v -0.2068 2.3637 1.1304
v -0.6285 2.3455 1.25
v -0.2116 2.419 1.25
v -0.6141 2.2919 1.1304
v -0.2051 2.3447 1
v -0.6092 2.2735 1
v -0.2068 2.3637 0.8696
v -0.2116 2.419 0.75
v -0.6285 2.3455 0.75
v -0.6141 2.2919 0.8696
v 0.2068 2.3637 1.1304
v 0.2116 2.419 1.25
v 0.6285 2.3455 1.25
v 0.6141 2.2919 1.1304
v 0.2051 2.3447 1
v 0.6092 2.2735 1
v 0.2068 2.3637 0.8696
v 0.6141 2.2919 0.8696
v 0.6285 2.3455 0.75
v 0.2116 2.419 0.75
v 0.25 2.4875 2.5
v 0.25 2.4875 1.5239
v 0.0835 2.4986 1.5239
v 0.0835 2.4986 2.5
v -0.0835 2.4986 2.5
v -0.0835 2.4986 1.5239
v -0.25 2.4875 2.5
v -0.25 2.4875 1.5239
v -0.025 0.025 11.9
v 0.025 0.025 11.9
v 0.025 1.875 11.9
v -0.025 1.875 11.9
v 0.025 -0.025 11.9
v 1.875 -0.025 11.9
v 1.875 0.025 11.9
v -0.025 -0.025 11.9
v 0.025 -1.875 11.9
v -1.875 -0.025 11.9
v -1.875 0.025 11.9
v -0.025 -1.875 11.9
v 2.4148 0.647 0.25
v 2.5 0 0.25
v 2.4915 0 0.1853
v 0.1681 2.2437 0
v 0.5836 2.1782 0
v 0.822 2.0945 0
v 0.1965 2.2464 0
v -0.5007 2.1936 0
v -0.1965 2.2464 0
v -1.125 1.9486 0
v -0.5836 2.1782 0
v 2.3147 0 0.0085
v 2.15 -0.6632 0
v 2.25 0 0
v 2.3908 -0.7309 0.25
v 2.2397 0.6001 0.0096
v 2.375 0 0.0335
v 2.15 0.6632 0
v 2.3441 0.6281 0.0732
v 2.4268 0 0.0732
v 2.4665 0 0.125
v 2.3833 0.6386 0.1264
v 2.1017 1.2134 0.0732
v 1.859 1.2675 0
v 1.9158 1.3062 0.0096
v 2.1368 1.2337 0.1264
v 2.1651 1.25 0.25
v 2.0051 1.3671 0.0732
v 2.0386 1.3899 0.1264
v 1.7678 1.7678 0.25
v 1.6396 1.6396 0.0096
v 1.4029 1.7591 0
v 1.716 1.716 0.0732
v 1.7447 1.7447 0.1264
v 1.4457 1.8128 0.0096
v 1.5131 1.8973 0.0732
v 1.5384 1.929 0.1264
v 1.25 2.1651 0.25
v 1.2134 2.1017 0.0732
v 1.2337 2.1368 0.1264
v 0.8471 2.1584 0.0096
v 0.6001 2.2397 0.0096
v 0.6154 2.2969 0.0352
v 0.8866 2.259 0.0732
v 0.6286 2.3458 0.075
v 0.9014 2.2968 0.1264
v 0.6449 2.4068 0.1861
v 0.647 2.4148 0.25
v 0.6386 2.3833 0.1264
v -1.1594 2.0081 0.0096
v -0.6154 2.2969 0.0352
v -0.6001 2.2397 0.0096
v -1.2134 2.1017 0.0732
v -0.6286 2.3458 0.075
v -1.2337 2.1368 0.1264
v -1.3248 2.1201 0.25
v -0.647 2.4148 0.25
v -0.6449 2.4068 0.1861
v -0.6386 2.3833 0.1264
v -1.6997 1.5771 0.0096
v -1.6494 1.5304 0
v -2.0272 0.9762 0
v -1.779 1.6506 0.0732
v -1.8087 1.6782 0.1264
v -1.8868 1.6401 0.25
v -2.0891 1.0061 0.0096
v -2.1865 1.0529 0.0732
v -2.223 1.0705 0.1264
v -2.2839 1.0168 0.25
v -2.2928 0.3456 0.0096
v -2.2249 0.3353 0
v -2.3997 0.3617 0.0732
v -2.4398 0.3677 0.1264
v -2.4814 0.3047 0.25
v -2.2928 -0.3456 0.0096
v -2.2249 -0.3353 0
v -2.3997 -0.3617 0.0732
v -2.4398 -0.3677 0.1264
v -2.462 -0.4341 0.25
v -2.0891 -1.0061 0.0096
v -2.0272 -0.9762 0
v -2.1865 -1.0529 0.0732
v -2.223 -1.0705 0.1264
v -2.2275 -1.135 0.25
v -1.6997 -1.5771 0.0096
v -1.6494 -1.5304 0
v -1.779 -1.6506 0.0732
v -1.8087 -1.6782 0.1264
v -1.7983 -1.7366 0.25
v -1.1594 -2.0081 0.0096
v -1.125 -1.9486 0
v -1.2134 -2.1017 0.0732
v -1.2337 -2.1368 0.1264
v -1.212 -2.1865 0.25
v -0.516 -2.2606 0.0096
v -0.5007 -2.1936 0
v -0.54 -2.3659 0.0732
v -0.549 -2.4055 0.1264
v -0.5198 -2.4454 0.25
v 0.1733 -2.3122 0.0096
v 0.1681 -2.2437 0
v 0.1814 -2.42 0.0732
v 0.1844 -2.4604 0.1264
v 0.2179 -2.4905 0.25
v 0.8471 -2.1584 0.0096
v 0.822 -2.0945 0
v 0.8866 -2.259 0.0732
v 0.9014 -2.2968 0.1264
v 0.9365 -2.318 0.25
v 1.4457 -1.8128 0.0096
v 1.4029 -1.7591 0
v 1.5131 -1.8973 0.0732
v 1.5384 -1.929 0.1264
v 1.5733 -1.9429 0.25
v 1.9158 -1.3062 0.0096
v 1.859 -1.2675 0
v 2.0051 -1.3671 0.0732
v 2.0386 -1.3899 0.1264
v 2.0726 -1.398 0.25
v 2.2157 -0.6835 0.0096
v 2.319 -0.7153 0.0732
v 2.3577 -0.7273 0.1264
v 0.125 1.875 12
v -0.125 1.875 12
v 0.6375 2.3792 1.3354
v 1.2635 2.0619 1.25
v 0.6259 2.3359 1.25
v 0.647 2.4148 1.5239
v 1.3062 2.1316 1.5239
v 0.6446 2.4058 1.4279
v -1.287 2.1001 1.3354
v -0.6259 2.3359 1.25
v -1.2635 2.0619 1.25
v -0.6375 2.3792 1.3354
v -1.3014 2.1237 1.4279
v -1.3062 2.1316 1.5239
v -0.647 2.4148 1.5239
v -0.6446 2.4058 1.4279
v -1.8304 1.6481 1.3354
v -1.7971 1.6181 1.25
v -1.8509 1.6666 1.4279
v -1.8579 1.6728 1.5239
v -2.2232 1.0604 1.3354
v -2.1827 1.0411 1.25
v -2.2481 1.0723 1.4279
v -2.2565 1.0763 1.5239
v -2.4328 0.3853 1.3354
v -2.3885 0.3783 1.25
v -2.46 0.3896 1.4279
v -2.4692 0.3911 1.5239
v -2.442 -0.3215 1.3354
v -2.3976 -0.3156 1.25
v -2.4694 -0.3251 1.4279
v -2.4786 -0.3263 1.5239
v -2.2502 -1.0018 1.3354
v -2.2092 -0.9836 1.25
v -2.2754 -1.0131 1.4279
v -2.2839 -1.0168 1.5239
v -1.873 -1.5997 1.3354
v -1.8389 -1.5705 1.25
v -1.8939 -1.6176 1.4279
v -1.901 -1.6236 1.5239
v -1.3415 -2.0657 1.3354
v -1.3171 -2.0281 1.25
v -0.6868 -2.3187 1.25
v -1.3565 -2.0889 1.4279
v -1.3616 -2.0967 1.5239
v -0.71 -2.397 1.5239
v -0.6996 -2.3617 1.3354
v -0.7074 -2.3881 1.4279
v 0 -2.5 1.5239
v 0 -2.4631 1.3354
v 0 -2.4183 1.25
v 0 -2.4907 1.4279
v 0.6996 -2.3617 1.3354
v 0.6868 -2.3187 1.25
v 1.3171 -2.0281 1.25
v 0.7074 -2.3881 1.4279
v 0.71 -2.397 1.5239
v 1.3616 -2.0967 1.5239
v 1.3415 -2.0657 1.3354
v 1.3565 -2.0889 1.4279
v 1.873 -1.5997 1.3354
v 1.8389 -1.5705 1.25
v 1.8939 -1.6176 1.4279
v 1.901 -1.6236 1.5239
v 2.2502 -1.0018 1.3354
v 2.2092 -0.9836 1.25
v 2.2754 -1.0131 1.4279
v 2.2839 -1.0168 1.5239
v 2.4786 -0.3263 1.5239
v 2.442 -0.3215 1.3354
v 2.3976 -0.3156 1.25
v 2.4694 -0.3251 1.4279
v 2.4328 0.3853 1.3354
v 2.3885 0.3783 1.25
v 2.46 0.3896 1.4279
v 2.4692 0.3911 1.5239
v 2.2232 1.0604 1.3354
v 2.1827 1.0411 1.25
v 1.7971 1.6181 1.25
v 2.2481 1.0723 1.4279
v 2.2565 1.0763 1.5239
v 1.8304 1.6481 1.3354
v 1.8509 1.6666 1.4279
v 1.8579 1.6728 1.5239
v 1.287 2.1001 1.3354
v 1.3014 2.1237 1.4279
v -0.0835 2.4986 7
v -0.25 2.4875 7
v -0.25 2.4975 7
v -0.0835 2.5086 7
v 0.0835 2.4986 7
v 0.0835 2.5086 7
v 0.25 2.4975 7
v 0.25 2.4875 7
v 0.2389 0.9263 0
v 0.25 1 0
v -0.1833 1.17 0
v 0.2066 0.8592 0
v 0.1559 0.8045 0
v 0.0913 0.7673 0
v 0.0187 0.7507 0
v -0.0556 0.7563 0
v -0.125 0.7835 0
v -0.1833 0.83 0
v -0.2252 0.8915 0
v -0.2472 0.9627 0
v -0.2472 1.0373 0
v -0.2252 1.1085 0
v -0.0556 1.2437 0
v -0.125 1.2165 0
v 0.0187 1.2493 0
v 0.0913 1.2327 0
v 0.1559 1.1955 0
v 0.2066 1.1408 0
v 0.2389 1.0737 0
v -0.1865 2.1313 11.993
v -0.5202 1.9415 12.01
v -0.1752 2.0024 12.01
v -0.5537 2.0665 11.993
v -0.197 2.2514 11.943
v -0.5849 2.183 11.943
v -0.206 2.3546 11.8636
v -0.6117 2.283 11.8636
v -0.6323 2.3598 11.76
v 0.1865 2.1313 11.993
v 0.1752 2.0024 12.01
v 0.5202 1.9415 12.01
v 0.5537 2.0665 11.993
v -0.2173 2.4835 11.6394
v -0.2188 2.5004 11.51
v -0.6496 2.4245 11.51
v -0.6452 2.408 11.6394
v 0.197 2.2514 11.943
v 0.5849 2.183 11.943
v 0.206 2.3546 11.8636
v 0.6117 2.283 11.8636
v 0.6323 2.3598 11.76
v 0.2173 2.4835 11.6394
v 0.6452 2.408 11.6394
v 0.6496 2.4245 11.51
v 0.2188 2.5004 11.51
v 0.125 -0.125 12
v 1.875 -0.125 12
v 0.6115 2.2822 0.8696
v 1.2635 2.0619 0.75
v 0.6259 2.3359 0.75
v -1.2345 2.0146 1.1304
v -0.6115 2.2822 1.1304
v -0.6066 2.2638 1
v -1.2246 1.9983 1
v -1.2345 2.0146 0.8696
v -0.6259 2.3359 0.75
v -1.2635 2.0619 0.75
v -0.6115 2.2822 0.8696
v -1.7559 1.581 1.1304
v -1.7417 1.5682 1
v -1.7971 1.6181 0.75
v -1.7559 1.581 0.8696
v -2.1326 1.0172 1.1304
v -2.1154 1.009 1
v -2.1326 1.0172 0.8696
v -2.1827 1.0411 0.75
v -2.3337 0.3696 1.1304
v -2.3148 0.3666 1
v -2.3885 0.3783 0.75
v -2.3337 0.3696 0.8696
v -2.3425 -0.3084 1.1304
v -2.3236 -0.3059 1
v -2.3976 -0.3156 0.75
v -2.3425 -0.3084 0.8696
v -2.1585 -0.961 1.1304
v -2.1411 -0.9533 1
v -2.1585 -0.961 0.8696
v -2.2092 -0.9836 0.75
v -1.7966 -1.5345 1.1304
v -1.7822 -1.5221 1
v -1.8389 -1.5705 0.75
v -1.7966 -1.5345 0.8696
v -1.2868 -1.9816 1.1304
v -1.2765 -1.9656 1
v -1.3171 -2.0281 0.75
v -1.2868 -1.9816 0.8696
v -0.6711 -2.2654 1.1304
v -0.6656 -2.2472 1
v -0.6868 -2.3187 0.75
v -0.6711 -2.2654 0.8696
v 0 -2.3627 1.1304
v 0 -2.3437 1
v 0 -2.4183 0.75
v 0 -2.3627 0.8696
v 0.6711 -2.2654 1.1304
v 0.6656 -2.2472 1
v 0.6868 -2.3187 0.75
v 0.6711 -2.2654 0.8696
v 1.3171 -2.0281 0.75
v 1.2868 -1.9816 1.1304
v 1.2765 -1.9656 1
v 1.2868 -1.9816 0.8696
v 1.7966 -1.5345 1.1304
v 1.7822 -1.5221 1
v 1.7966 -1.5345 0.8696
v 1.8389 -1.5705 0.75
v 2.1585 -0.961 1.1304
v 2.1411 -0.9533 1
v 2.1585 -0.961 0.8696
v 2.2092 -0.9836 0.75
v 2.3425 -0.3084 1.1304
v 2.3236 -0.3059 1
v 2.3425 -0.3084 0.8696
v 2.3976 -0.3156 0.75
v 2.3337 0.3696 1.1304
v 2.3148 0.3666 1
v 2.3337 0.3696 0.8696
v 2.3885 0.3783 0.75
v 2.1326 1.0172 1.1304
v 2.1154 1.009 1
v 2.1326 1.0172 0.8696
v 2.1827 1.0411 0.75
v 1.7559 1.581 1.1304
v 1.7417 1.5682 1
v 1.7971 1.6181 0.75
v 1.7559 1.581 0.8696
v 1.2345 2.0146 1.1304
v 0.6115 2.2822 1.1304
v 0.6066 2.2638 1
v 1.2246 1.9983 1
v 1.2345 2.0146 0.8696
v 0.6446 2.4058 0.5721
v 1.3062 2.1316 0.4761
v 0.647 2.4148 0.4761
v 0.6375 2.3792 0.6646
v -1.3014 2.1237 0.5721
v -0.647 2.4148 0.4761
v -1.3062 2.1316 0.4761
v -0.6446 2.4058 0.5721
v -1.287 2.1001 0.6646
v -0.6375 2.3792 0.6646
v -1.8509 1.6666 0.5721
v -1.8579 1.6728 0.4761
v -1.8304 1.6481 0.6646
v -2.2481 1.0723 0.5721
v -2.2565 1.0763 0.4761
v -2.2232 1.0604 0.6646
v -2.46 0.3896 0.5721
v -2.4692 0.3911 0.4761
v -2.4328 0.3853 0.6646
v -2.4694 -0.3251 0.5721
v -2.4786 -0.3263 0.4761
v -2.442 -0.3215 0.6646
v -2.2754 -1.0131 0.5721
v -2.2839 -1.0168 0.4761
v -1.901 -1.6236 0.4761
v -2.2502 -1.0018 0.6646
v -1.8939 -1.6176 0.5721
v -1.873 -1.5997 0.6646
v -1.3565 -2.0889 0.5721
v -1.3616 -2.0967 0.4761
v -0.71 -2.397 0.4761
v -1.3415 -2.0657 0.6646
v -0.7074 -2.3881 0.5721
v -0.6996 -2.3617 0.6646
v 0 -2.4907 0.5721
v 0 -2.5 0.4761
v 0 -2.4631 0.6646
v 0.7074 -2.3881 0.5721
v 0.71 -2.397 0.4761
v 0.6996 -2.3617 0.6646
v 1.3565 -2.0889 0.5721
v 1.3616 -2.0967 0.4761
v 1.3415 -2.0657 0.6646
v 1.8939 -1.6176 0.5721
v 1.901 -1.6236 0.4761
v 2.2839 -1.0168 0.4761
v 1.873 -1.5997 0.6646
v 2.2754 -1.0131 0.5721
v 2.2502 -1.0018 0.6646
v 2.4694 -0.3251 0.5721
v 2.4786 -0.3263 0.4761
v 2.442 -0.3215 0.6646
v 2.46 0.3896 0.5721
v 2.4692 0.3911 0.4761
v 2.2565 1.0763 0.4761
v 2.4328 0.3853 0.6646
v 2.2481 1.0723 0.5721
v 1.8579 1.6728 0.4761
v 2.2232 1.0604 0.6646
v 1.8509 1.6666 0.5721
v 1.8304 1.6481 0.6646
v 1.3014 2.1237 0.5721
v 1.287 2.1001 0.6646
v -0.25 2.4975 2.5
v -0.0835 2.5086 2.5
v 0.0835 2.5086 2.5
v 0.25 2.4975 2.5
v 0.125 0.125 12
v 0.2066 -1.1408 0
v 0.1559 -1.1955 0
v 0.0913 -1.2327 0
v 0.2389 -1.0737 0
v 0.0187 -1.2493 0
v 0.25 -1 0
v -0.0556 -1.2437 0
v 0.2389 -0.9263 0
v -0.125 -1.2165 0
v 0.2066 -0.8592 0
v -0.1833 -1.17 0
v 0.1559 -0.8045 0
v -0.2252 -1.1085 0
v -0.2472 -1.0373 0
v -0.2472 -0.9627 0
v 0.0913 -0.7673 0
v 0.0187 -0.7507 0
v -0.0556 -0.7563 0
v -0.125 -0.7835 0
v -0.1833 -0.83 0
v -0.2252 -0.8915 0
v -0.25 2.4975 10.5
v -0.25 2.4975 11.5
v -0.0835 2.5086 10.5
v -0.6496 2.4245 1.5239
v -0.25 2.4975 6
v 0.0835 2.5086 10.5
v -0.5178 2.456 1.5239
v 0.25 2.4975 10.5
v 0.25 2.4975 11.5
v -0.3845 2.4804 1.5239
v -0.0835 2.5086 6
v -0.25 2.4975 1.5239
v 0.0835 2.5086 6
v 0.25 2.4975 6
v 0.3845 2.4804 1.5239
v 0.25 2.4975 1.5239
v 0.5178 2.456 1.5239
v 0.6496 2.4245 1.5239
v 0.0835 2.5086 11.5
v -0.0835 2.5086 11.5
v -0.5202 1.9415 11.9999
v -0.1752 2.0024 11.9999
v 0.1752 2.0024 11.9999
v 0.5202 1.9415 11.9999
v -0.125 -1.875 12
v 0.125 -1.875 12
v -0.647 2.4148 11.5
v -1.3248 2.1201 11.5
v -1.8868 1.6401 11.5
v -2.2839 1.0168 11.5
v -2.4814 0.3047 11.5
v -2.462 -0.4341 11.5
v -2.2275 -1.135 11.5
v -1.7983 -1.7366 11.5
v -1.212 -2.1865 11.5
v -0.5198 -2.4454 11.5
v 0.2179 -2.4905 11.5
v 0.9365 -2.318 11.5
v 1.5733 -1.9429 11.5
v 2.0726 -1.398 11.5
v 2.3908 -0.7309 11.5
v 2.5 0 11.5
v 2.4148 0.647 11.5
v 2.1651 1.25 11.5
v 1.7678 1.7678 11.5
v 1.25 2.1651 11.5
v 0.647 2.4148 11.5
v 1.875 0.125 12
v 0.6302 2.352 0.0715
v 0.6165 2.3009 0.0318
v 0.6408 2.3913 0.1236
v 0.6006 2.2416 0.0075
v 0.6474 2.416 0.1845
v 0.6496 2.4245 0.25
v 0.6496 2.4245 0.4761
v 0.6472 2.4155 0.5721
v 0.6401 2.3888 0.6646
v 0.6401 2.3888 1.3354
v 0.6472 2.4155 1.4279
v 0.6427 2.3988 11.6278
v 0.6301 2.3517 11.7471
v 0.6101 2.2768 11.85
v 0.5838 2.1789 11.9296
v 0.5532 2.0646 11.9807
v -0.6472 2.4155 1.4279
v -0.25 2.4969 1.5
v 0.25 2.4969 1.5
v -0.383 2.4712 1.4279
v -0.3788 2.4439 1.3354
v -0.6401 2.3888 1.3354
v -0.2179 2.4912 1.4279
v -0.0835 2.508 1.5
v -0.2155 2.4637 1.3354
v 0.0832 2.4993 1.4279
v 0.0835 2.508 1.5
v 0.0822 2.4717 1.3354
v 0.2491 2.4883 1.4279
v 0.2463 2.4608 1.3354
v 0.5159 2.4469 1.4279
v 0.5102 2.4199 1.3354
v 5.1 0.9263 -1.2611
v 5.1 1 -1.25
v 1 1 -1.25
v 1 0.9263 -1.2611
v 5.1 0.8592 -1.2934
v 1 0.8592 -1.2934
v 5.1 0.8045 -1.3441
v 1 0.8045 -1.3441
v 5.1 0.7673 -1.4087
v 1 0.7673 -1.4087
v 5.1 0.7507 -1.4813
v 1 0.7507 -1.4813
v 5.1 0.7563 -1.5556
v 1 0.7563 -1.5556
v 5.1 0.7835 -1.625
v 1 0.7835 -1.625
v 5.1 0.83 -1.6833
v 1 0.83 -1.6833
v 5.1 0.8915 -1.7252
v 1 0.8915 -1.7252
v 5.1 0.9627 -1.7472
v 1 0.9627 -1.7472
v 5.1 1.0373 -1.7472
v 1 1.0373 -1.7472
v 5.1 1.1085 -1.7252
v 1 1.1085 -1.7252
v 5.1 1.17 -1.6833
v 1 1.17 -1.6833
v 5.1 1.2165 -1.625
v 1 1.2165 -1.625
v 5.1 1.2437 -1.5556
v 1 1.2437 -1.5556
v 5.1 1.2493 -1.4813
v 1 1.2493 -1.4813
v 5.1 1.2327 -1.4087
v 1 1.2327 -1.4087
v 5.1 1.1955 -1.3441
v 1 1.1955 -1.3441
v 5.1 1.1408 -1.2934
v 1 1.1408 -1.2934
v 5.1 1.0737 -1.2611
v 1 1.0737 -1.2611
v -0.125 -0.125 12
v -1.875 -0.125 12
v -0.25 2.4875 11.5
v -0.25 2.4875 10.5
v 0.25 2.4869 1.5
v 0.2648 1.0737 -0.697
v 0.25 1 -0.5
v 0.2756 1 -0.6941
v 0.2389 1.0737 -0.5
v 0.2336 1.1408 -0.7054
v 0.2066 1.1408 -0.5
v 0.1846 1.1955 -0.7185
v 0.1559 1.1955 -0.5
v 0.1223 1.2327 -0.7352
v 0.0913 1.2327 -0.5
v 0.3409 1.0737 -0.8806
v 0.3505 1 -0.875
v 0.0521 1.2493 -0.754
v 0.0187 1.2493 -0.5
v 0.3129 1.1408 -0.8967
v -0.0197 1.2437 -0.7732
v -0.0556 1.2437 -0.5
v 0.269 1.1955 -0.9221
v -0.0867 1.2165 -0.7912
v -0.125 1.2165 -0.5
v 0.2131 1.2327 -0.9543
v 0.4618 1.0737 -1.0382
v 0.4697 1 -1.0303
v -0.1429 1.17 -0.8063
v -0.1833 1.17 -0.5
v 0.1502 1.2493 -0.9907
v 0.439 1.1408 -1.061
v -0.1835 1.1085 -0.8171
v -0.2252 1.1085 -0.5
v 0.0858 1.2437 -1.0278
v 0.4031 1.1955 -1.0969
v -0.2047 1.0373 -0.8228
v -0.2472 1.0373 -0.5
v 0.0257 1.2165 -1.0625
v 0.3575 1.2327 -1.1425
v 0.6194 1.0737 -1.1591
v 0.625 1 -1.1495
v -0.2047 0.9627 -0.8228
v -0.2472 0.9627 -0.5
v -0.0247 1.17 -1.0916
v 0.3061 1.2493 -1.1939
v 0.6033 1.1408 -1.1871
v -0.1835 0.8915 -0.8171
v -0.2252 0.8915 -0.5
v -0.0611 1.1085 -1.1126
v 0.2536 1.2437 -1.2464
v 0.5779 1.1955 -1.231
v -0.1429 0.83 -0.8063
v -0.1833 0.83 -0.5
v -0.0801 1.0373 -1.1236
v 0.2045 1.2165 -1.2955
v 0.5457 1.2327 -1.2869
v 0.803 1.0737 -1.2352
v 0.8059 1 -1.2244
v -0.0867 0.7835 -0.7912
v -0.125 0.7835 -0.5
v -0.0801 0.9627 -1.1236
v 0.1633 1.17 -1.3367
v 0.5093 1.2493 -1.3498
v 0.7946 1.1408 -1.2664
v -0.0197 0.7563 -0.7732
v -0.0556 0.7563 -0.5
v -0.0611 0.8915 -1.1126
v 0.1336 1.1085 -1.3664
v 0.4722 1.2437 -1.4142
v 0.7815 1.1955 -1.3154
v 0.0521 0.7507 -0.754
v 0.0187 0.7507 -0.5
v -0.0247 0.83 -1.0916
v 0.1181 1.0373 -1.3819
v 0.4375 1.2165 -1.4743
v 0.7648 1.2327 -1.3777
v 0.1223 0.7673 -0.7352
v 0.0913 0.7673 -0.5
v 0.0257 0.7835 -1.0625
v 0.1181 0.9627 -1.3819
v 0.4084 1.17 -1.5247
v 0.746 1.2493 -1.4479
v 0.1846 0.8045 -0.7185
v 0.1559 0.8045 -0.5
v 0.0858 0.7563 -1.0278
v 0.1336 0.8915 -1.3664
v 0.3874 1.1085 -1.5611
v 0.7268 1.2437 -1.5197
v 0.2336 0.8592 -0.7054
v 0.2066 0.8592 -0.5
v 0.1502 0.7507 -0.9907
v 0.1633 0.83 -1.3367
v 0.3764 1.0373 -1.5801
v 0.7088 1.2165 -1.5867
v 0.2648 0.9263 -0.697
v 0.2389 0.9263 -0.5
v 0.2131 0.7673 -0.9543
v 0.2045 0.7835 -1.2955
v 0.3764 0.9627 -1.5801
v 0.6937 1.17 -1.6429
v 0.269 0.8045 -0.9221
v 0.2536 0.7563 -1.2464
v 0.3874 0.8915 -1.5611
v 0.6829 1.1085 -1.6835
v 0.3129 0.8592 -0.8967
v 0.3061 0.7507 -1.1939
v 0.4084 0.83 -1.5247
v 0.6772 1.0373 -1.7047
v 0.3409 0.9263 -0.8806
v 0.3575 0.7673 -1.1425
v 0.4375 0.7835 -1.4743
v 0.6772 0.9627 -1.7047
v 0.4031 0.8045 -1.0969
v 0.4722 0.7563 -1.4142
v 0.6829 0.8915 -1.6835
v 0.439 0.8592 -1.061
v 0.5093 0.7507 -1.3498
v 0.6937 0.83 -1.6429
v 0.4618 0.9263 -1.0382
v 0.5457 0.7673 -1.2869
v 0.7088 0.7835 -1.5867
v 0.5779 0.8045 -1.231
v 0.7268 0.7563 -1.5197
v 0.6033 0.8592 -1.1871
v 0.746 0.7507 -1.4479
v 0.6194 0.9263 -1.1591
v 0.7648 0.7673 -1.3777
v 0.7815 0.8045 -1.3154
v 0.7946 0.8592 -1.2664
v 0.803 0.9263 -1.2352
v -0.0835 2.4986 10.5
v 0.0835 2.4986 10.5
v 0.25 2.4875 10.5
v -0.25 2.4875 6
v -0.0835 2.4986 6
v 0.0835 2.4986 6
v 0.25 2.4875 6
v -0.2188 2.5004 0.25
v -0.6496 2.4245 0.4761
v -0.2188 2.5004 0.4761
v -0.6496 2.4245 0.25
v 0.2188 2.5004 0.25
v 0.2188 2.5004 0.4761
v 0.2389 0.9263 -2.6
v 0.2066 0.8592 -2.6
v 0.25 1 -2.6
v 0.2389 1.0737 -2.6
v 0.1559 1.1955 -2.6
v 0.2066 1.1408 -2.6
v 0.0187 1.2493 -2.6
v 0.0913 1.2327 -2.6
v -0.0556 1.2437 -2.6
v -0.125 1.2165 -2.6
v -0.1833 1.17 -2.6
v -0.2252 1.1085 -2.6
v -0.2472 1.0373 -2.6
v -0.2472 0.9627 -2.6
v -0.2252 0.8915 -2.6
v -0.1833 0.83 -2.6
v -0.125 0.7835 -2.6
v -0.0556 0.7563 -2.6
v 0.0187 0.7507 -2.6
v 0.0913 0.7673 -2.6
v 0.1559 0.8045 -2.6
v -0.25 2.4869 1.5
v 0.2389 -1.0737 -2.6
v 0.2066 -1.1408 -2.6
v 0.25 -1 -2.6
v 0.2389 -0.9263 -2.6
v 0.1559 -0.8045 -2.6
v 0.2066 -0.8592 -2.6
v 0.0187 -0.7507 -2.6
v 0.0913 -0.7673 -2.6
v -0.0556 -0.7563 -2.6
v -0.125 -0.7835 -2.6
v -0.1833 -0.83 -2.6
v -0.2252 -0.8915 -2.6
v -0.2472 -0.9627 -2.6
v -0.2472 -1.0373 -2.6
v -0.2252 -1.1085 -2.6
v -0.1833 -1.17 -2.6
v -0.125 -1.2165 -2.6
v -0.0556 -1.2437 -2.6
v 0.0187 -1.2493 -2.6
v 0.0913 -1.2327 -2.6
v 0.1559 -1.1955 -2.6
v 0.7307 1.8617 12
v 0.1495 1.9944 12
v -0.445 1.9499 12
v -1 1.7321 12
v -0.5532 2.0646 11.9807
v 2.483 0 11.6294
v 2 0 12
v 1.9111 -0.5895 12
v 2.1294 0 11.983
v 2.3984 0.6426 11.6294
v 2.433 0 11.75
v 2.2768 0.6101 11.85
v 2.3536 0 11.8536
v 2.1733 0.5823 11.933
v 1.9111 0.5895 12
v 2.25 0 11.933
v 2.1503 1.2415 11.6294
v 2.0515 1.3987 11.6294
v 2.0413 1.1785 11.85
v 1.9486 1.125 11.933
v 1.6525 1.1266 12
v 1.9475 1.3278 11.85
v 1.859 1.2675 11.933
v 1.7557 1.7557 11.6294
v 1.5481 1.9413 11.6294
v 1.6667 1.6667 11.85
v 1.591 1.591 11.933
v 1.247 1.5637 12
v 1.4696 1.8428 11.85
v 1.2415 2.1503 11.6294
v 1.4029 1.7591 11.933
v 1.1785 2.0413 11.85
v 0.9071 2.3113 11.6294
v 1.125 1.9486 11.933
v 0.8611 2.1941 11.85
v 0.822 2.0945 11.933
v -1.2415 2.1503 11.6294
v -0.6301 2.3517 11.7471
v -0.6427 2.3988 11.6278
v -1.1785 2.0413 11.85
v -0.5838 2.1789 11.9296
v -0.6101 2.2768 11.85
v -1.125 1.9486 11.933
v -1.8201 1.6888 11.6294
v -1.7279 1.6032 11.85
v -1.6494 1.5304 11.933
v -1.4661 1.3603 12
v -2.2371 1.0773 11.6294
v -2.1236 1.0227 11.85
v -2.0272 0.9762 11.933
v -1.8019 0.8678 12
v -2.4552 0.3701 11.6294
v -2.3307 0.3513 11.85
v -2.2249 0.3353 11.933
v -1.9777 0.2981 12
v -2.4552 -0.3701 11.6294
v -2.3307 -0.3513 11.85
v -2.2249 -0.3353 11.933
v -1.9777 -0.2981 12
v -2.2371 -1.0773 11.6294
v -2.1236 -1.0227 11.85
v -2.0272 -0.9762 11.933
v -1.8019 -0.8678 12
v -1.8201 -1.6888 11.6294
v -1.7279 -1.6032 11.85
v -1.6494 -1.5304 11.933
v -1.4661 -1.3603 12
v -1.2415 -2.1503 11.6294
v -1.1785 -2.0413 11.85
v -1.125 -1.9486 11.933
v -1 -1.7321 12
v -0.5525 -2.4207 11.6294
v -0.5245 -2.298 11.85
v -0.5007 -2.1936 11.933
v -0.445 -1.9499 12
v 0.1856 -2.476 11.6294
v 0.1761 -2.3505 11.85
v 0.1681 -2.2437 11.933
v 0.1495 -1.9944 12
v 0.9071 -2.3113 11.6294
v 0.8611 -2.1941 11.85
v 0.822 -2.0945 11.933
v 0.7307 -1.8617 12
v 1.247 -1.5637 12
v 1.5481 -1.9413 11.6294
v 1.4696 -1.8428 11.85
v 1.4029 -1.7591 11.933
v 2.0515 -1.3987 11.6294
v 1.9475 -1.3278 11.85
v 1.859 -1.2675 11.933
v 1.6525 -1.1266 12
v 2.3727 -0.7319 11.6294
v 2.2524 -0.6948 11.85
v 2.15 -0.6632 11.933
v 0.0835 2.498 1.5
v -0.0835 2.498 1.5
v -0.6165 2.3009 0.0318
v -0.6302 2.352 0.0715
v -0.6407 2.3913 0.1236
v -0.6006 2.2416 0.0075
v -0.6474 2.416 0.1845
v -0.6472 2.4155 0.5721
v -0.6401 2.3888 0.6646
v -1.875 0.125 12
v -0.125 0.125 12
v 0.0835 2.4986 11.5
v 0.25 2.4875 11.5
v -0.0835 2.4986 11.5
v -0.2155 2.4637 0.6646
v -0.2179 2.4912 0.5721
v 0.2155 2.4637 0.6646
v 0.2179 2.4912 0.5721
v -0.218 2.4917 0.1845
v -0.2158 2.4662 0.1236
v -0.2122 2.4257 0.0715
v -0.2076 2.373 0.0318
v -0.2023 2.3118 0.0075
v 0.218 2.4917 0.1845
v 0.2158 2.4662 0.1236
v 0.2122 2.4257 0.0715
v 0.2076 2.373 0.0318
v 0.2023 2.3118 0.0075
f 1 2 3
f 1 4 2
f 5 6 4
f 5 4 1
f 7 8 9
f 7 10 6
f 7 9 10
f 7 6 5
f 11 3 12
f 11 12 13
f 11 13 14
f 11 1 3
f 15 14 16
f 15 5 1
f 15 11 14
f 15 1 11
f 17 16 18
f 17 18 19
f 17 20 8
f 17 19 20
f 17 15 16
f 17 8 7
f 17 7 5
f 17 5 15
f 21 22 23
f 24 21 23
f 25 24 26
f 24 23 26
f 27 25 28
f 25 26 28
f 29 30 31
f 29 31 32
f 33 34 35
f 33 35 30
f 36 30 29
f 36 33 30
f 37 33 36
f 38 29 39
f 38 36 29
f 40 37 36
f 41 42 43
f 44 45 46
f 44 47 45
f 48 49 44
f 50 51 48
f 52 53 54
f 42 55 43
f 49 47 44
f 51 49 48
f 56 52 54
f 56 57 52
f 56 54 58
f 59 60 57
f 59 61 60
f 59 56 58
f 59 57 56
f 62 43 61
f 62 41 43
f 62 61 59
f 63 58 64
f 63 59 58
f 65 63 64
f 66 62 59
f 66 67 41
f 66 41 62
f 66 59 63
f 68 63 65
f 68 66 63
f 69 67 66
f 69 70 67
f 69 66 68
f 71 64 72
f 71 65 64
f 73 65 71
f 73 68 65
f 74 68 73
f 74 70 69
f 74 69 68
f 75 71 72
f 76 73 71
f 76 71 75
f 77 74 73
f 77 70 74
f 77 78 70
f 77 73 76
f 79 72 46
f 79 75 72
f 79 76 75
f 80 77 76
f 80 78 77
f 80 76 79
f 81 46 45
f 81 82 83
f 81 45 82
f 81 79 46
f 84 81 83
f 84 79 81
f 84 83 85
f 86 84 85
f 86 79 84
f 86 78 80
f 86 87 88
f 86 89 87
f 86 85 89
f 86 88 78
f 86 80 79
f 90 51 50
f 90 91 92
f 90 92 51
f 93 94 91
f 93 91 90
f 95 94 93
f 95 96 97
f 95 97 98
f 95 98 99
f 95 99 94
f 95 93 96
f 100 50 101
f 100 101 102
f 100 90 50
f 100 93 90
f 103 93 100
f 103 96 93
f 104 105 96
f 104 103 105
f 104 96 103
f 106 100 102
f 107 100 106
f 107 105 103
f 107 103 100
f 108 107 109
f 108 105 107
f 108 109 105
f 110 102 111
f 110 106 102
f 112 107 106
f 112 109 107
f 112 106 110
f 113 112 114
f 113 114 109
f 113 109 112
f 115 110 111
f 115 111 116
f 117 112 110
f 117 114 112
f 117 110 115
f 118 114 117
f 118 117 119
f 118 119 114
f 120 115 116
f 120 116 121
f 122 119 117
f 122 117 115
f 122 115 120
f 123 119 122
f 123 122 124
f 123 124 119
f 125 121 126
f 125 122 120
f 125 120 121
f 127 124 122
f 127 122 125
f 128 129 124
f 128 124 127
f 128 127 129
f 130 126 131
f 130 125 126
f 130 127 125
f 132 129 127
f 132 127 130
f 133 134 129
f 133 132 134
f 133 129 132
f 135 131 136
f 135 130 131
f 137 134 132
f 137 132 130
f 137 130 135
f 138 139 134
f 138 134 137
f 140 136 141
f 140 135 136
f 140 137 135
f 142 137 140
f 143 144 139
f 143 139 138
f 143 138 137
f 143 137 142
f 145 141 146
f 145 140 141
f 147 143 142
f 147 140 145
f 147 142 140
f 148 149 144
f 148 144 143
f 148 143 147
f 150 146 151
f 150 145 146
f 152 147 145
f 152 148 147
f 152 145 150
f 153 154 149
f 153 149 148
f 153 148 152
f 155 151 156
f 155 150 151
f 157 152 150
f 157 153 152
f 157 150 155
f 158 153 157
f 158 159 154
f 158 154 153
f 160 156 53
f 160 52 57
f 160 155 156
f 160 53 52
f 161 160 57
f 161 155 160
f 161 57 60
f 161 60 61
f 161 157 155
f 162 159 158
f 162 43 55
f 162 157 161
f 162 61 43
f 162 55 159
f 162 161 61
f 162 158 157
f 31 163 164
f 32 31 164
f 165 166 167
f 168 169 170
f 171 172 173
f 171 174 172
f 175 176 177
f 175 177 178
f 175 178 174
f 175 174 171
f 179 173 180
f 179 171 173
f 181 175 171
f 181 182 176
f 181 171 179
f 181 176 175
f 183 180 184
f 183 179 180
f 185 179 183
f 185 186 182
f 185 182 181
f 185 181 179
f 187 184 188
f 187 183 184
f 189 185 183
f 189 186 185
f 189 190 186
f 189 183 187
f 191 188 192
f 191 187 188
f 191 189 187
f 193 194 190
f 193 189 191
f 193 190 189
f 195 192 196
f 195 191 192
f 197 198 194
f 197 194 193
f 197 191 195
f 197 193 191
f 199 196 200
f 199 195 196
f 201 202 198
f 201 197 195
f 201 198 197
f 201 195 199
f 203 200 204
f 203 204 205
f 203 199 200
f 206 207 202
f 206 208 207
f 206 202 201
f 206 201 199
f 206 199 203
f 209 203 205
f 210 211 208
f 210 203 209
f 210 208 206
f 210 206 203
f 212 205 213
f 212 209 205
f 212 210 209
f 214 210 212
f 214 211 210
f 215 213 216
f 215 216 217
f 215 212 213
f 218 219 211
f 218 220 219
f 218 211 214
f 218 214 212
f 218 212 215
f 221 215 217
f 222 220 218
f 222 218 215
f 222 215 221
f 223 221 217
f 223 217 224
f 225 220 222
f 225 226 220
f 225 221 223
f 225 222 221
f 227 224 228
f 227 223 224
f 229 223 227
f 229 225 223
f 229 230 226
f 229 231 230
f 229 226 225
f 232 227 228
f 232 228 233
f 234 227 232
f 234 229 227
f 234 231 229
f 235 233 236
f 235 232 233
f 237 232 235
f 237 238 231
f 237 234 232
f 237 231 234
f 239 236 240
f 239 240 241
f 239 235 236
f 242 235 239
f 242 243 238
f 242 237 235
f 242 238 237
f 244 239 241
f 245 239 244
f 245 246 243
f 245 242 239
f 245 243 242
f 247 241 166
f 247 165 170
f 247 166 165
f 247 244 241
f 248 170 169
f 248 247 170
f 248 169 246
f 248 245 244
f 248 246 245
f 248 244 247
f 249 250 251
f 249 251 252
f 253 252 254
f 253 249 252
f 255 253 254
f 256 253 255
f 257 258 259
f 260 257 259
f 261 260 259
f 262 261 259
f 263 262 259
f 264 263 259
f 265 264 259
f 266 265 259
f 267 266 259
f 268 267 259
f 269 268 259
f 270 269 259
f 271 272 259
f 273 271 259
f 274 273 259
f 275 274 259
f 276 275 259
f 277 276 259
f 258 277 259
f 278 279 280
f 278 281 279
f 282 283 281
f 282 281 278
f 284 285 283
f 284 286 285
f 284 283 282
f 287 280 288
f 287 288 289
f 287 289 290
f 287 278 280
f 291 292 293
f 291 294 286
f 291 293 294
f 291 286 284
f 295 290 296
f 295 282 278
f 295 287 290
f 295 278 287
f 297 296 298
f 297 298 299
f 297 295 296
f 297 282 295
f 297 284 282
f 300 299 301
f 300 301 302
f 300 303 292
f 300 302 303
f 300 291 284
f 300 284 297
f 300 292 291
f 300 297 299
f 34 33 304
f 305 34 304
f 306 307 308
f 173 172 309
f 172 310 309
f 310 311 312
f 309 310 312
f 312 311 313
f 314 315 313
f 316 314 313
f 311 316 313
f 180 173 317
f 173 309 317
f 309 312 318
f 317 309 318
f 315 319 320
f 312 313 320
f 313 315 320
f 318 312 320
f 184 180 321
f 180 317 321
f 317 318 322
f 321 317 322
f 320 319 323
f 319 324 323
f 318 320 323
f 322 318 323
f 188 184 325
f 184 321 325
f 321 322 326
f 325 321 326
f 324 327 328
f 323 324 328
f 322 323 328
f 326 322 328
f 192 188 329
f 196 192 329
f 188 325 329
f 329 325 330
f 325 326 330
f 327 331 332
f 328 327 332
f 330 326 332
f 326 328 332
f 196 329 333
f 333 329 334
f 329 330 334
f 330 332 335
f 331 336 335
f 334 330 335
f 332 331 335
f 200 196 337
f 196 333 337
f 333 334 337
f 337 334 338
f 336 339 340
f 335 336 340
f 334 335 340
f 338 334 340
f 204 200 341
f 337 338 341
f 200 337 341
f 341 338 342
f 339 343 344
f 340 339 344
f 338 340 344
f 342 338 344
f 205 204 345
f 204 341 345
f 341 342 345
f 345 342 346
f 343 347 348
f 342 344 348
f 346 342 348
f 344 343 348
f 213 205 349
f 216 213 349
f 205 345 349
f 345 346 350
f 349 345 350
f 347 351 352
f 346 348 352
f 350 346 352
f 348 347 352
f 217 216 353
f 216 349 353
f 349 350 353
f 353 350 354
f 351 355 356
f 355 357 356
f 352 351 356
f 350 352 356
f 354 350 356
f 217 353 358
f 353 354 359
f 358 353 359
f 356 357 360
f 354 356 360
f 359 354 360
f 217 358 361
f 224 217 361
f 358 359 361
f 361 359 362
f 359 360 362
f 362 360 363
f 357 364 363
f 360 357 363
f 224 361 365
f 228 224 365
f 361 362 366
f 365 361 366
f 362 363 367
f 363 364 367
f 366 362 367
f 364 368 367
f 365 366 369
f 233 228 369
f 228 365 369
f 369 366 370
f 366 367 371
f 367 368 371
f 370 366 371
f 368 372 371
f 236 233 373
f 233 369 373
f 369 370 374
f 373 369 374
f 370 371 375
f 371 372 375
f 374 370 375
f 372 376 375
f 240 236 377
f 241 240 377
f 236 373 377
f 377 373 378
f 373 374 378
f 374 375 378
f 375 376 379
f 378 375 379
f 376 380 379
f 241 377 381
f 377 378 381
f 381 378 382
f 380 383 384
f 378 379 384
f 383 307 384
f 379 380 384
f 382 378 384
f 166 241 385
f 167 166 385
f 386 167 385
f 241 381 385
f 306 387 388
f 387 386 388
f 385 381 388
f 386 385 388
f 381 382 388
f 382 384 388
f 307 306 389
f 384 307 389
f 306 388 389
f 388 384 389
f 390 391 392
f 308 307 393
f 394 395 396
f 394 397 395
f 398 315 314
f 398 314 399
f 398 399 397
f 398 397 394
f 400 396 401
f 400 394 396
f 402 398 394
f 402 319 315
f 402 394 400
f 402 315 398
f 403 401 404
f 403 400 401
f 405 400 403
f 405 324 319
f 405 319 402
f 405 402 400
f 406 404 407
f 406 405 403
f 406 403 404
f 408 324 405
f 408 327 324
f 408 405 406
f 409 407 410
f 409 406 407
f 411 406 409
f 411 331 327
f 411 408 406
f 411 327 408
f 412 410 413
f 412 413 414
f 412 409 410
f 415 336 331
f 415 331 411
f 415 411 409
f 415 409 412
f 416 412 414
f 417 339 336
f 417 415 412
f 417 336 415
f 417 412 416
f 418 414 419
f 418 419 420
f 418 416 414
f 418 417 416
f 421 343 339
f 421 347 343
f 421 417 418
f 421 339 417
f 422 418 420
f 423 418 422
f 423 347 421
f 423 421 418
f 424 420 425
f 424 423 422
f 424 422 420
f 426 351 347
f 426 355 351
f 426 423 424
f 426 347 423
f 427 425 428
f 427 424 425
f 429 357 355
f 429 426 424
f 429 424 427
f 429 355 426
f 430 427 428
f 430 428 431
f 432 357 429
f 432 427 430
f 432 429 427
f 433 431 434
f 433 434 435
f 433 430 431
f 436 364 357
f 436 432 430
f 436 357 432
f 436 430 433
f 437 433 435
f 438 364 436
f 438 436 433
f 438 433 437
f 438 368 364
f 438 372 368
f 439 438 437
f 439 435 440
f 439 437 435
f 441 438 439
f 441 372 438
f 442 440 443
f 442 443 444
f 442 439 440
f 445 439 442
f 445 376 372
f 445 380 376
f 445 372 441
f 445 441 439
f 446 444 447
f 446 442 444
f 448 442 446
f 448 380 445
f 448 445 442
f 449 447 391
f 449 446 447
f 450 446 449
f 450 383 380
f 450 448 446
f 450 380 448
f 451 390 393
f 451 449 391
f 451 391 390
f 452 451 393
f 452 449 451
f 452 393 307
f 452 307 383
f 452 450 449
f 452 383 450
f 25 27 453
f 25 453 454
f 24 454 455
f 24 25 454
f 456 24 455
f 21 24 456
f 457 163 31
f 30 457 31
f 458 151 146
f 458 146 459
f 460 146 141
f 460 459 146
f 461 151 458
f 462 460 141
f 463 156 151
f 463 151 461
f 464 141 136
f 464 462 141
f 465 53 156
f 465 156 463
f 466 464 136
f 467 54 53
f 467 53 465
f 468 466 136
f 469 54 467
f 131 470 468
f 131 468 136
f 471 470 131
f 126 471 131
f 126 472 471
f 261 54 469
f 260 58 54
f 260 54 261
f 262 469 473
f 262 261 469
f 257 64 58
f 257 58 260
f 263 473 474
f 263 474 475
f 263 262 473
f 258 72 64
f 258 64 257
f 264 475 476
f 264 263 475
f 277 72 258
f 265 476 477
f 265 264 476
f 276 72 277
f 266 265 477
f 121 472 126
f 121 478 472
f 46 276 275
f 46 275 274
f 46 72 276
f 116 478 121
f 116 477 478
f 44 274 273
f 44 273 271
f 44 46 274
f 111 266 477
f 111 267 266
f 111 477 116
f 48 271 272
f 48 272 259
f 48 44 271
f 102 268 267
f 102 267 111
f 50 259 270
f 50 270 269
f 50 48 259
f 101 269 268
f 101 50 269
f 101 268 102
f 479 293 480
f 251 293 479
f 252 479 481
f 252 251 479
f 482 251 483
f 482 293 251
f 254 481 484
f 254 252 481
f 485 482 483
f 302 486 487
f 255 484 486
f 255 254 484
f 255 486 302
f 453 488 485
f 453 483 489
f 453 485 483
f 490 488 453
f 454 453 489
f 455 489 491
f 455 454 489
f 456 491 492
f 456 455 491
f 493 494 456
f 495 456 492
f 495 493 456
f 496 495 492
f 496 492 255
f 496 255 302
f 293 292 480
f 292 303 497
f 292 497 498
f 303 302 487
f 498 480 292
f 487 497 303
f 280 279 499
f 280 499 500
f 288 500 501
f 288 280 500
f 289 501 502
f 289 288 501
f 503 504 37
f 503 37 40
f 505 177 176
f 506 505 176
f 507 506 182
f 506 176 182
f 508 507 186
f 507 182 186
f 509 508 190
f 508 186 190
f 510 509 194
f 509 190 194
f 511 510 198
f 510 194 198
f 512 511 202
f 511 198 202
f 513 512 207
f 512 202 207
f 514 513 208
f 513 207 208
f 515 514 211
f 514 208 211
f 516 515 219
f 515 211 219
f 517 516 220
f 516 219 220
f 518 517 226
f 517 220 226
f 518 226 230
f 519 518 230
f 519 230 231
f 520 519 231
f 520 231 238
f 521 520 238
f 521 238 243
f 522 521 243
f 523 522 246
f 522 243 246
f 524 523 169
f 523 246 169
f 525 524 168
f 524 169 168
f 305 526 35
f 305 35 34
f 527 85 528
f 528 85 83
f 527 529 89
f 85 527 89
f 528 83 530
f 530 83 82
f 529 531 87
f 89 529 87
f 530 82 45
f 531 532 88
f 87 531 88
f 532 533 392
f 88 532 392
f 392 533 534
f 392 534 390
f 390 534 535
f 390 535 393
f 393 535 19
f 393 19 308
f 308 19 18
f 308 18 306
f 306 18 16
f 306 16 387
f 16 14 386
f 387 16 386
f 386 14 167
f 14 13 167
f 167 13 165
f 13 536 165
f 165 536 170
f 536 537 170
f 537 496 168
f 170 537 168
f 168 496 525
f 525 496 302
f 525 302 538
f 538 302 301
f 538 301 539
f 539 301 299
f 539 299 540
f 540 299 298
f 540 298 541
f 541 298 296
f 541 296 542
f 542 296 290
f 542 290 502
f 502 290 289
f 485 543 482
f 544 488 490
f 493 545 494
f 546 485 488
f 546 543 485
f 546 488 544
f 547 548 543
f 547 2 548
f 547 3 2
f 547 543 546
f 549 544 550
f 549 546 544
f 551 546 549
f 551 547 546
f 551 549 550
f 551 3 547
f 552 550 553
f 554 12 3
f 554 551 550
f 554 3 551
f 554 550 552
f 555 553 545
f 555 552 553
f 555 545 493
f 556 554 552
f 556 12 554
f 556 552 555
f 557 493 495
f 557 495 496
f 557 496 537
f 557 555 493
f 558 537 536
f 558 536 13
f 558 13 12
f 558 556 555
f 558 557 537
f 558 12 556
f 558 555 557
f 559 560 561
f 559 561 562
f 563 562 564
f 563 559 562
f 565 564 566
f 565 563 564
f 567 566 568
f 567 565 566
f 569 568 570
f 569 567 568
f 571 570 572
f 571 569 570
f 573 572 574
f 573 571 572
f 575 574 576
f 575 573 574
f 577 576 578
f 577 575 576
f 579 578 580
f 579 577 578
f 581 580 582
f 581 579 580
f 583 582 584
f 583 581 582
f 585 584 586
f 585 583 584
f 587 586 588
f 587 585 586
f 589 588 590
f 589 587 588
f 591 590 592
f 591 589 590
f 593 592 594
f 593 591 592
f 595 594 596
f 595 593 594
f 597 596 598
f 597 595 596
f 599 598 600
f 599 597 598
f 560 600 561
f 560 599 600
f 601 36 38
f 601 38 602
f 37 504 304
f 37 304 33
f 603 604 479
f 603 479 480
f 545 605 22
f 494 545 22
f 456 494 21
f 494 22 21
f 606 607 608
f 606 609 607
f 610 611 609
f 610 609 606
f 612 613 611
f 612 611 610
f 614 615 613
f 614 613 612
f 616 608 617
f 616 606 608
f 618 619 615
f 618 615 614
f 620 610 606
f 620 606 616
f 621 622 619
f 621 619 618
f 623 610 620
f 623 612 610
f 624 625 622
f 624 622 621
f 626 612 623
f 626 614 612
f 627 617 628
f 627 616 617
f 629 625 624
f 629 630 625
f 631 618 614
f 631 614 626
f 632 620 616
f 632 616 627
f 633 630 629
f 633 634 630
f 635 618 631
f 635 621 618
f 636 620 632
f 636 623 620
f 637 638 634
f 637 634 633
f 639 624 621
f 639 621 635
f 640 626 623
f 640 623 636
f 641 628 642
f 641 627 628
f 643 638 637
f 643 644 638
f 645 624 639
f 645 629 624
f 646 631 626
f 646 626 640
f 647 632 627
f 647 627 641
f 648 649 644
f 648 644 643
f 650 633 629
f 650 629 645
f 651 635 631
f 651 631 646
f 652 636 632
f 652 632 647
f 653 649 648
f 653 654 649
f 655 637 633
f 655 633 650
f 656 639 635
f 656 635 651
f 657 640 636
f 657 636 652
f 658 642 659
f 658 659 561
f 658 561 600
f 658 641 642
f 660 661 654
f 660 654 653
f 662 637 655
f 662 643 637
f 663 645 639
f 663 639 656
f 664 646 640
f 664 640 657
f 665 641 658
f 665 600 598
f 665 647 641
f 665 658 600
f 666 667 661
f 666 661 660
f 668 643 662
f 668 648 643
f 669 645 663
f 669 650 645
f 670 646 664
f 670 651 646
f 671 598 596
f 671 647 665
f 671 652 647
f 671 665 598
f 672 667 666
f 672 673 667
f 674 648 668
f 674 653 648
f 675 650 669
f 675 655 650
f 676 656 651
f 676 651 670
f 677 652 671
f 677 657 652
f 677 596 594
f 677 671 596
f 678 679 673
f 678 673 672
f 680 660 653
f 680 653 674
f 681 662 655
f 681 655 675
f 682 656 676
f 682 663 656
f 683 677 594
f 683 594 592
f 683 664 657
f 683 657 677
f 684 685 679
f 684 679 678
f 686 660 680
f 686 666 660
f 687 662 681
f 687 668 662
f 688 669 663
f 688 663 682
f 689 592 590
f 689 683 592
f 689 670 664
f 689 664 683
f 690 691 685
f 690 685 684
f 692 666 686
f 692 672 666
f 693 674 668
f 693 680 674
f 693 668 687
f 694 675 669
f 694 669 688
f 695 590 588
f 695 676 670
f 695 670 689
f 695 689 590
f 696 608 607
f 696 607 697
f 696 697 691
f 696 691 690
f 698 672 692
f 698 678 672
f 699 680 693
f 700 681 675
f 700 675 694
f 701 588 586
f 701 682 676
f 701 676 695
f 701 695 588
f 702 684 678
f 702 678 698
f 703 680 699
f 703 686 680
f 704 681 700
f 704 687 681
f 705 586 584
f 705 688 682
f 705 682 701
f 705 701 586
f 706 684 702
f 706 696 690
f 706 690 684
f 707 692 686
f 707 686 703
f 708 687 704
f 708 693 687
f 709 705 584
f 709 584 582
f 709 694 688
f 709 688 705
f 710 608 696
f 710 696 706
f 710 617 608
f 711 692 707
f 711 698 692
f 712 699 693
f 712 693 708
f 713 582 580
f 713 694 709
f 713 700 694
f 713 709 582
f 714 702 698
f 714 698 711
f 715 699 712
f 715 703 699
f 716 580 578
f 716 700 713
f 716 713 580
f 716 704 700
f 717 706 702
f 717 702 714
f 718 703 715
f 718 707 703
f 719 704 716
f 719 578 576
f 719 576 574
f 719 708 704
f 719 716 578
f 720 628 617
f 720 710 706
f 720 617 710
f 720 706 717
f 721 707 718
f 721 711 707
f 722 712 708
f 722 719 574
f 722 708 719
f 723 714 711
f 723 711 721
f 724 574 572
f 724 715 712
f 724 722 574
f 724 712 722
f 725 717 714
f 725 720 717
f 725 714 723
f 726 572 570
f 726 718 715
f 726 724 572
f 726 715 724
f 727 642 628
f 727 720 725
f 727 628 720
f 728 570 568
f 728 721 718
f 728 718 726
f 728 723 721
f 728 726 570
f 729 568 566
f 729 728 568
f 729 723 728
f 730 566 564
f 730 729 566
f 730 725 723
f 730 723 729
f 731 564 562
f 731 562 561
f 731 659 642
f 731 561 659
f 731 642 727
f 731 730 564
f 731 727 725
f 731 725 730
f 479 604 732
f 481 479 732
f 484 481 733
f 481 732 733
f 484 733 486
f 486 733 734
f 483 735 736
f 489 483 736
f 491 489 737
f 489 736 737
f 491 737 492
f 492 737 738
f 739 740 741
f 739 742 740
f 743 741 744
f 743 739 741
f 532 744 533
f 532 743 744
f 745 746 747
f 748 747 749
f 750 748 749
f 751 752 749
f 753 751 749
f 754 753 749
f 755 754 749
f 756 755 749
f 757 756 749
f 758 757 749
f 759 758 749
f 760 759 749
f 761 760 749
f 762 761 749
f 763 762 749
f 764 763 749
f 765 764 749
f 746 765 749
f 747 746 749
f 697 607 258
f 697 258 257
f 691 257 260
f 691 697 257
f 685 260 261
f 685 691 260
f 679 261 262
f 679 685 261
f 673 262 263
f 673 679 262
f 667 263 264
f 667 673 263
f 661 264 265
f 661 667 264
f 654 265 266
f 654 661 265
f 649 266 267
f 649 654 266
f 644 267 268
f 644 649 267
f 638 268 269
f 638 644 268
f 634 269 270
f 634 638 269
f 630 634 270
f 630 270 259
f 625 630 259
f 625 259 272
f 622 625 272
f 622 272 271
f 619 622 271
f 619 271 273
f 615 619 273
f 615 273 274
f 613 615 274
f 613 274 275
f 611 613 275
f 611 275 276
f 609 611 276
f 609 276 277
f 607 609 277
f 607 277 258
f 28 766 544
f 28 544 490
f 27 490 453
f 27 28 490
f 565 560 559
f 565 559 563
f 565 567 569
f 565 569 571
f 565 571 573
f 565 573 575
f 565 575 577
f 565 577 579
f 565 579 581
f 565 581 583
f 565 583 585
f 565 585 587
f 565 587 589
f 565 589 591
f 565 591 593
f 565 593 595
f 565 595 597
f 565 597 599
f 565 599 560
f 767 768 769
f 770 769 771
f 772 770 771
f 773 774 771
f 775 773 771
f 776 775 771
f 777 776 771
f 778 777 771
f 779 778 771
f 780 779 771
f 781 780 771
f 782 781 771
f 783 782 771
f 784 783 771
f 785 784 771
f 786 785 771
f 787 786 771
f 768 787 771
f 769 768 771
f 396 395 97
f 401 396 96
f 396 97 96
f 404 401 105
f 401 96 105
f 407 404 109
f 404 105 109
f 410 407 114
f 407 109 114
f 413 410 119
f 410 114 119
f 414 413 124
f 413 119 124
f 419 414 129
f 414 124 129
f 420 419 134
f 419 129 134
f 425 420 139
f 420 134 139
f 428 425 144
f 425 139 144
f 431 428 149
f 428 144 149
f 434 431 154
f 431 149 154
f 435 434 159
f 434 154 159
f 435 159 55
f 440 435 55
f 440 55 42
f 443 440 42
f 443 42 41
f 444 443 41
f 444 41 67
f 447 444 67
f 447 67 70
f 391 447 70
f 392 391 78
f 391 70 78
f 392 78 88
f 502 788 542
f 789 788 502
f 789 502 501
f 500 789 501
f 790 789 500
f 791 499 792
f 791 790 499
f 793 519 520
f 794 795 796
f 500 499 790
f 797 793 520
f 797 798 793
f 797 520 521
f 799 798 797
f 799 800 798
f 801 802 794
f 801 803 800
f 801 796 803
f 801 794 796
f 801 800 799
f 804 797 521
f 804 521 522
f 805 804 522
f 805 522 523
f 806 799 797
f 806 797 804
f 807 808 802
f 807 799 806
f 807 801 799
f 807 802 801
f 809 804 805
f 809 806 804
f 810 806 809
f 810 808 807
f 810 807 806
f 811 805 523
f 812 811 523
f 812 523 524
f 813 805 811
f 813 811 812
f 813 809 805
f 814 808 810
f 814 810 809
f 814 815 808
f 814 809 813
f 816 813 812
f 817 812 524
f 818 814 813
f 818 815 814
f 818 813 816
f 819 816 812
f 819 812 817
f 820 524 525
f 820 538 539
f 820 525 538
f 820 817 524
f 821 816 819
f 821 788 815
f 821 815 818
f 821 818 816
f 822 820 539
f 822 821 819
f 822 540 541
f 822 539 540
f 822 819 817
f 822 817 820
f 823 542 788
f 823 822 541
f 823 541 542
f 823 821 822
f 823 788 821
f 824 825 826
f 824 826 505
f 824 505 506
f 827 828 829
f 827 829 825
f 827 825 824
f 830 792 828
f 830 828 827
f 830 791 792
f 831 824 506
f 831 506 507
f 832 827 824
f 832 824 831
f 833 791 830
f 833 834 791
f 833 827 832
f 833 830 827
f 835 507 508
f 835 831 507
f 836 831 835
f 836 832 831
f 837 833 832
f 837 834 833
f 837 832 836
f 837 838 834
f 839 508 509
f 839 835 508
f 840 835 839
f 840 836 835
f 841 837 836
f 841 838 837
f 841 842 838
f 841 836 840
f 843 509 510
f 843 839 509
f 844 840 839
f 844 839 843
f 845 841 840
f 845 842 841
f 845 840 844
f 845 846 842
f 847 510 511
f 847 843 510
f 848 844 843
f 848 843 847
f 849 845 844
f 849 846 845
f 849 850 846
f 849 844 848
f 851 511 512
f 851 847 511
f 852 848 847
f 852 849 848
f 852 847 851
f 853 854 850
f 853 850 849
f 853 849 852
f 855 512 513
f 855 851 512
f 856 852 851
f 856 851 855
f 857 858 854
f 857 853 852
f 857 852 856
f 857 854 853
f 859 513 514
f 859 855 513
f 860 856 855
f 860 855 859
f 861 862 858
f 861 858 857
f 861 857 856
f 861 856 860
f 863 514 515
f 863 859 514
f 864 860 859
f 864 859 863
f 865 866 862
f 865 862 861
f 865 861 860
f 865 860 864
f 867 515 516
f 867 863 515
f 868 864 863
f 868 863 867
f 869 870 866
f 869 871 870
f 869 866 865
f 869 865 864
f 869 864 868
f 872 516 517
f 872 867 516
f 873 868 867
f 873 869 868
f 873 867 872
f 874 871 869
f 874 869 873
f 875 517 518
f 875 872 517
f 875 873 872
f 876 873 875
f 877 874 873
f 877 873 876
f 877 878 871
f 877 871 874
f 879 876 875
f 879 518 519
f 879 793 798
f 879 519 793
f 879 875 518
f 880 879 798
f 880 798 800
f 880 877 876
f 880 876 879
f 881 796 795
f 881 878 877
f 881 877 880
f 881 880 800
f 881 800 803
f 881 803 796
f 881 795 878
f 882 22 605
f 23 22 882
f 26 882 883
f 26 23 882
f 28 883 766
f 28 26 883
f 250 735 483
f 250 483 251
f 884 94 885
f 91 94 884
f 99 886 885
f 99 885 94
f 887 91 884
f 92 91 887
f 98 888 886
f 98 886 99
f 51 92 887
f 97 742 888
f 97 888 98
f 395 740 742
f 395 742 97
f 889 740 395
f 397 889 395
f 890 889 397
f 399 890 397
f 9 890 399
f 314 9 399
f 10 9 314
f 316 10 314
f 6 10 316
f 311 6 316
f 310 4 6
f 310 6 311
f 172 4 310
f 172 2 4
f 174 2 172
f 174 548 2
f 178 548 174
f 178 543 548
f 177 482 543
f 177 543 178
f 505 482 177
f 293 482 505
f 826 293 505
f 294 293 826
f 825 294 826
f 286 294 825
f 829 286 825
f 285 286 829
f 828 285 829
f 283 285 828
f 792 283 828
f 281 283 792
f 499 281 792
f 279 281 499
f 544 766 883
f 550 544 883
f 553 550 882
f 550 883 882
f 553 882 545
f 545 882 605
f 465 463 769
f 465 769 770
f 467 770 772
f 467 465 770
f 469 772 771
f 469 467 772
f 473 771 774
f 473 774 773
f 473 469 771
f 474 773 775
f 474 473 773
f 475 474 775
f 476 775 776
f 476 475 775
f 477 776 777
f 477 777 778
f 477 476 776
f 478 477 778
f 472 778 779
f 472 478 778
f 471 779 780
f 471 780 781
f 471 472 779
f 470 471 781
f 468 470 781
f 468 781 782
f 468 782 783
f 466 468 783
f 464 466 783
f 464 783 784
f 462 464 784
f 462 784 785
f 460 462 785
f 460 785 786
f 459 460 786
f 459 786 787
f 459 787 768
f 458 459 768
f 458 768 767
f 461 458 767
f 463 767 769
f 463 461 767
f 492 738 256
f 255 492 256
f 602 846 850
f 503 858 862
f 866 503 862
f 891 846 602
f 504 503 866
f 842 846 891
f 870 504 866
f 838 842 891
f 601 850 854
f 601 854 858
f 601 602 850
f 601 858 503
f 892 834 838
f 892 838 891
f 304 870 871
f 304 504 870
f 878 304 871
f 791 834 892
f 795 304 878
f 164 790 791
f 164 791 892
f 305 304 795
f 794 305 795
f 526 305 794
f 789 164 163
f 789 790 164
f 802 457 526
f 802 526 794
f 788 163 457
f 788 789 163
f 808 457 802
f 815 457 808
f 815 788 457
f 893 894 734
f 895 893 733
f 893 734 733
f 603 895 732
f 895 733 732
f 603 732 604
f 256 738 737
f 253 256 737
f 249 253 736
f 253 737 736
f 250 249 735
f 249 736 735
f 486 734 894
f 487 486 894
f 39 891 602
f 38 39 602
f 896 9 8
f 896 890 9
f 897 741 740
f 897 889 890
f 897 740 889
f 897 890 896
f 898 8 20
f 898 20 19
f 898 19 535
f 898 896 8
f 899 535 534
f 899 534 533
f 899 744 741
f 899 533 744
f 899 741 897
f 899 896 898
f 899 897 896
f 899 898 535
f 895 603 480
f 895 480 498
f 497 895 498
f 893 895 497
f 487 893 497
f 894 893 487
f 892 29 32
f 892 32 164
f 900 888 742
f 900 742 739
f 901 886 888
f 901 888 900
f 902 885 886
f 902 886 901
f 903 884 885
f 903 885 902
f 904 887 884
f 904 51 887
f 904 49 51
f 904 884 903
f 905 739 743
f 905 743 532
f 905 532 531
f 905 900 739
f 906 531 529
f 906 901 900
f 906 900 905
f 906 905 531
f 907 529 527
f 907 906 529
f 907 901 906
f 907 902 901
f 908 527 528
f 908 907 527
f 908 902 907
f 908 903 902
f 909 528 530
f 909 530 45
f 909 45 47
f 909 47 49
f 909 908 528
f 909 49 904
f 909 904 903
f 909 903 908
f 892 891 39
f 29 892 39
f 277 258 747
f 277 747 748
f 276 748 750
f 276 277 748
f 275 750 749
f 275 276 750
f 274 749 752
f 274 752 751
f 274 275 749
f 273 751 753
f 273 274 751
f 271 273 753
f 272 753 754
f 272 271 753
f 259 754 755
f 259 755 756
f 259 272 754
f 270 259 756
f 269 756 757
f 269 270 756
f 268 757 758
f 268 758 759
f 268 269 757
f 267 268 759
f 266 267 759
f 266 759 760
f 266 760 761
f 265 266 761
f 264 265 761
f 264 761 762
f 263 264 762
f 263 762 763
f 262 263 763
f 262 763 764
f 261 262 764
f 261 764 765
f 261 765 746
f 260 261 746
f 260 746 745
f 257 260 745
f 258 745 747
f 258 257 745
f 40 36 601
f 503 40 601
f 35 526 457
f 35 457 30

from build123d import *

# Parameters (mm, degrees)
SKETCH003_R         = 0.25
REVOLUTION001_ANGLE = -30
SKETCH015_W         = 0.5
SKETCH015_H         = 1
POCKET002_DEPTH     = 2.511
LINEARPATTERN_COUNT = 3
LINEARPATTERN_PITCH = 4.5
SKETCH010_R         = 0.25
PAD002_DEPTH        = 2.6
SKETCH013_R         = 2
PAD_DEPTH           = 0.5
POCKET001_DEPTH     = 1.875
POLARPATTERN_COUNT  = 3
POLARPATTERN_ANGLE  = 180
SKETCH012_R         = 2
POCKET_DEPTH        = 0.5


with BuildPart() as leadangledclone:
    # AdditivePipe: sweep along a path in Sketch004
    with BuildLine(Plane.XZ) as additivepipe_path:
        Line((0, 0), (0, -0.5))
        ThreePointArc((0, -0.5), (0.292893, -1.207107), (1, -1.5))
        Line((1, -1.5), (5.1, -1.5))
    # Sketch003 (on ShapeBinder) → AdditivePipe (sweep)
    with BuildSketch(Plane(origin=(0, 0, 0), x_dir=(1, 0, 0), z_dir=(0, 0, -1))):
        with Locations((0, 1)):
            Circle(SKETCH003_R)
    sweep(path=additivepipe_path.line)


with BuildPart() as leadangledclone_1:
    # Body003 placement: moved
    add(leadangledclone.part.moved(Location((0, 2, 0))))


with BuildPart() as polaritymarking:
    # Sketch005 → Revolution001 (revolve)
    with BuildSketch(Plane(origin=(0, 0, 0), x_dir=(-0.258819, 0.965926, 0), z_dir=(0.965926, 0.258819, 0))):
        with BuildLine():
            Line((2.01, 0.25), (2.01, 12.01))
            ThreePointArc((2.01, 12.01), (2.363553, 11.863553), (2.51, 11.51))
            Line((2.51, 11.51), (2.51, 1.523941))
            ThreePointArc((2.51, 1.523941), (2.489134, 1.381006), (2.428278, 1.25))
            ThreePointArc((2.428278, 1.25), (2.353698, 1), (2.428278, 0.75))
            ThreePointArc((2.428278, 0.75), (2.489134, 0.618994), (2.51, 0.476059))
            Line((2.51, 0.476059), (2.51, 0.25))
            ThreePointArc((2.51, 0.25), (2.26, 0), (2.01, 0.25))
        make_face()
    revolve(axis=Axis((0, 0, 0), (0, 0, 1)), revolution_arc=REVOLUTION001_ANGLE)

    # Sketch015 → Pocket002 (cut, through all)
    with BuildSketch(Plane.XZ):
        with Locations((0, 2)):
            Rectangle(SKETCH015_W, SKETCH015_H)
    pocket002 = extrude(amount=-POCKET002_DEPTH, mode=Mode.SUBTRACT)

    # LinearPattern: Pocket002 ×3
    with Locations(*[(0, 0, i * LINEARPATTERN_PITCH) for i in range(1, LINEARPATTERN_COUNT)]):
        add(pocket002, mode=Mode.SUBTRACT)


with BuildPart() as leadstraight:
    # Sketch010 → Pad002 (new body)
    with BuildSketch(Plane(origin=(0, 1, 0), x_dir=(1, 0, 0), z_dir=(0, 0, 1))):
        Circle(SKETCH010_R)
    extrude(amount=-PAD002_DEPTH)


with BuildPart() as leadstraightclone:
    # Body007 base: copy of LeadStraight
    add(leadstraight.part)


with BuildPart() as leadstraightclone_1:
    # Body007 placement: moved
    add(leadstraightclone.part.moved(Location((0, -2, 0))))


with BuildPart() as housingtop:
    # Sketch013 (on ShapeBinder) → Pad (new body)
    with BuildSketch(Plane.XY.offset(11.5)):
        Circle(SKETCH013_R)
    extrude(amount=PAD_DEPTH)

    # Sketch014 → Pocket001 (cut, symmetric)
    with BuildSketch(Plane.XZ):
        Polygon((-0.125, 12), (0.125, 12), (0.025, 11.9), (-0.025, 11.9), align=None)
    pocket001 = extrude(amount=POCKET001_DEPTH, both=True, mode=Mode.SUBTRACT)

    # PolarPattern: Pocket001 ×3 about axis
    polarpattern_axis = Axis((0, 0, 0), (0, 0, 1))
    for i in range(1, POLARPATTERN_COUNT):
        add(pocket001.rotate(polarpattern_axis, i * POLARPATTERN_ANGLE / (POLARPATTERN_COUNT - 1)), mode=Mode.SUBTRACT)


with BuildPart() as fusion:
    # Sketch → Revolution (revolve)
    with BuildSketch(Plane.XZ):
        with BuildLine():
            Line((0, 12), (2, 12))
            ThreePointArc((2.5, 11.5), (2.353553, 11.853553), (2, 12))
            Line((2.5, 11.5), (2.5, 1.523941))
            ThreePointArc((2.418278, 1.25), (2.479134, 1.381006), (2.5, 1.523941))
            ThreePointArc((2.418278, 1.25), (2.343698, 1), (2.418278, 0.75))
            ThreePointArc((2.5, 0.476059), (2.479134, 0.618994), (2.418278, 0.75))
            Line((2.5, 0.476059), (2.5, 0.25))
            ThreePointArc((2.25, 0), (2.426777, 0.073223), (2.5, 0.25))
            Line((0, 0), (2.25, 0))
            Line((0, 12), (0, 0))
        make_face()
    revolve(axis=Axis((0, 0, 0), (0, 0, 1)))

    # Sketch012 → Pocket (cut)
    with BuildSketch(Plane.XY.offset(12)):
        Circle(SKETCH012_R)
    extrude(amount=-POCKET_DEPTH, mode=Mode.SUBTRACT)

    # Fusion: union PolarityMarking, LeadStraight, LeadStraightClone, HousingTop
    add(polaritymarking.part)
    add(leadstraight.part)
    add(leadstraightclone_1.part)
    add(housingtop.part)


solid = Compound([leadangledclone_1.part, fusion.part])
